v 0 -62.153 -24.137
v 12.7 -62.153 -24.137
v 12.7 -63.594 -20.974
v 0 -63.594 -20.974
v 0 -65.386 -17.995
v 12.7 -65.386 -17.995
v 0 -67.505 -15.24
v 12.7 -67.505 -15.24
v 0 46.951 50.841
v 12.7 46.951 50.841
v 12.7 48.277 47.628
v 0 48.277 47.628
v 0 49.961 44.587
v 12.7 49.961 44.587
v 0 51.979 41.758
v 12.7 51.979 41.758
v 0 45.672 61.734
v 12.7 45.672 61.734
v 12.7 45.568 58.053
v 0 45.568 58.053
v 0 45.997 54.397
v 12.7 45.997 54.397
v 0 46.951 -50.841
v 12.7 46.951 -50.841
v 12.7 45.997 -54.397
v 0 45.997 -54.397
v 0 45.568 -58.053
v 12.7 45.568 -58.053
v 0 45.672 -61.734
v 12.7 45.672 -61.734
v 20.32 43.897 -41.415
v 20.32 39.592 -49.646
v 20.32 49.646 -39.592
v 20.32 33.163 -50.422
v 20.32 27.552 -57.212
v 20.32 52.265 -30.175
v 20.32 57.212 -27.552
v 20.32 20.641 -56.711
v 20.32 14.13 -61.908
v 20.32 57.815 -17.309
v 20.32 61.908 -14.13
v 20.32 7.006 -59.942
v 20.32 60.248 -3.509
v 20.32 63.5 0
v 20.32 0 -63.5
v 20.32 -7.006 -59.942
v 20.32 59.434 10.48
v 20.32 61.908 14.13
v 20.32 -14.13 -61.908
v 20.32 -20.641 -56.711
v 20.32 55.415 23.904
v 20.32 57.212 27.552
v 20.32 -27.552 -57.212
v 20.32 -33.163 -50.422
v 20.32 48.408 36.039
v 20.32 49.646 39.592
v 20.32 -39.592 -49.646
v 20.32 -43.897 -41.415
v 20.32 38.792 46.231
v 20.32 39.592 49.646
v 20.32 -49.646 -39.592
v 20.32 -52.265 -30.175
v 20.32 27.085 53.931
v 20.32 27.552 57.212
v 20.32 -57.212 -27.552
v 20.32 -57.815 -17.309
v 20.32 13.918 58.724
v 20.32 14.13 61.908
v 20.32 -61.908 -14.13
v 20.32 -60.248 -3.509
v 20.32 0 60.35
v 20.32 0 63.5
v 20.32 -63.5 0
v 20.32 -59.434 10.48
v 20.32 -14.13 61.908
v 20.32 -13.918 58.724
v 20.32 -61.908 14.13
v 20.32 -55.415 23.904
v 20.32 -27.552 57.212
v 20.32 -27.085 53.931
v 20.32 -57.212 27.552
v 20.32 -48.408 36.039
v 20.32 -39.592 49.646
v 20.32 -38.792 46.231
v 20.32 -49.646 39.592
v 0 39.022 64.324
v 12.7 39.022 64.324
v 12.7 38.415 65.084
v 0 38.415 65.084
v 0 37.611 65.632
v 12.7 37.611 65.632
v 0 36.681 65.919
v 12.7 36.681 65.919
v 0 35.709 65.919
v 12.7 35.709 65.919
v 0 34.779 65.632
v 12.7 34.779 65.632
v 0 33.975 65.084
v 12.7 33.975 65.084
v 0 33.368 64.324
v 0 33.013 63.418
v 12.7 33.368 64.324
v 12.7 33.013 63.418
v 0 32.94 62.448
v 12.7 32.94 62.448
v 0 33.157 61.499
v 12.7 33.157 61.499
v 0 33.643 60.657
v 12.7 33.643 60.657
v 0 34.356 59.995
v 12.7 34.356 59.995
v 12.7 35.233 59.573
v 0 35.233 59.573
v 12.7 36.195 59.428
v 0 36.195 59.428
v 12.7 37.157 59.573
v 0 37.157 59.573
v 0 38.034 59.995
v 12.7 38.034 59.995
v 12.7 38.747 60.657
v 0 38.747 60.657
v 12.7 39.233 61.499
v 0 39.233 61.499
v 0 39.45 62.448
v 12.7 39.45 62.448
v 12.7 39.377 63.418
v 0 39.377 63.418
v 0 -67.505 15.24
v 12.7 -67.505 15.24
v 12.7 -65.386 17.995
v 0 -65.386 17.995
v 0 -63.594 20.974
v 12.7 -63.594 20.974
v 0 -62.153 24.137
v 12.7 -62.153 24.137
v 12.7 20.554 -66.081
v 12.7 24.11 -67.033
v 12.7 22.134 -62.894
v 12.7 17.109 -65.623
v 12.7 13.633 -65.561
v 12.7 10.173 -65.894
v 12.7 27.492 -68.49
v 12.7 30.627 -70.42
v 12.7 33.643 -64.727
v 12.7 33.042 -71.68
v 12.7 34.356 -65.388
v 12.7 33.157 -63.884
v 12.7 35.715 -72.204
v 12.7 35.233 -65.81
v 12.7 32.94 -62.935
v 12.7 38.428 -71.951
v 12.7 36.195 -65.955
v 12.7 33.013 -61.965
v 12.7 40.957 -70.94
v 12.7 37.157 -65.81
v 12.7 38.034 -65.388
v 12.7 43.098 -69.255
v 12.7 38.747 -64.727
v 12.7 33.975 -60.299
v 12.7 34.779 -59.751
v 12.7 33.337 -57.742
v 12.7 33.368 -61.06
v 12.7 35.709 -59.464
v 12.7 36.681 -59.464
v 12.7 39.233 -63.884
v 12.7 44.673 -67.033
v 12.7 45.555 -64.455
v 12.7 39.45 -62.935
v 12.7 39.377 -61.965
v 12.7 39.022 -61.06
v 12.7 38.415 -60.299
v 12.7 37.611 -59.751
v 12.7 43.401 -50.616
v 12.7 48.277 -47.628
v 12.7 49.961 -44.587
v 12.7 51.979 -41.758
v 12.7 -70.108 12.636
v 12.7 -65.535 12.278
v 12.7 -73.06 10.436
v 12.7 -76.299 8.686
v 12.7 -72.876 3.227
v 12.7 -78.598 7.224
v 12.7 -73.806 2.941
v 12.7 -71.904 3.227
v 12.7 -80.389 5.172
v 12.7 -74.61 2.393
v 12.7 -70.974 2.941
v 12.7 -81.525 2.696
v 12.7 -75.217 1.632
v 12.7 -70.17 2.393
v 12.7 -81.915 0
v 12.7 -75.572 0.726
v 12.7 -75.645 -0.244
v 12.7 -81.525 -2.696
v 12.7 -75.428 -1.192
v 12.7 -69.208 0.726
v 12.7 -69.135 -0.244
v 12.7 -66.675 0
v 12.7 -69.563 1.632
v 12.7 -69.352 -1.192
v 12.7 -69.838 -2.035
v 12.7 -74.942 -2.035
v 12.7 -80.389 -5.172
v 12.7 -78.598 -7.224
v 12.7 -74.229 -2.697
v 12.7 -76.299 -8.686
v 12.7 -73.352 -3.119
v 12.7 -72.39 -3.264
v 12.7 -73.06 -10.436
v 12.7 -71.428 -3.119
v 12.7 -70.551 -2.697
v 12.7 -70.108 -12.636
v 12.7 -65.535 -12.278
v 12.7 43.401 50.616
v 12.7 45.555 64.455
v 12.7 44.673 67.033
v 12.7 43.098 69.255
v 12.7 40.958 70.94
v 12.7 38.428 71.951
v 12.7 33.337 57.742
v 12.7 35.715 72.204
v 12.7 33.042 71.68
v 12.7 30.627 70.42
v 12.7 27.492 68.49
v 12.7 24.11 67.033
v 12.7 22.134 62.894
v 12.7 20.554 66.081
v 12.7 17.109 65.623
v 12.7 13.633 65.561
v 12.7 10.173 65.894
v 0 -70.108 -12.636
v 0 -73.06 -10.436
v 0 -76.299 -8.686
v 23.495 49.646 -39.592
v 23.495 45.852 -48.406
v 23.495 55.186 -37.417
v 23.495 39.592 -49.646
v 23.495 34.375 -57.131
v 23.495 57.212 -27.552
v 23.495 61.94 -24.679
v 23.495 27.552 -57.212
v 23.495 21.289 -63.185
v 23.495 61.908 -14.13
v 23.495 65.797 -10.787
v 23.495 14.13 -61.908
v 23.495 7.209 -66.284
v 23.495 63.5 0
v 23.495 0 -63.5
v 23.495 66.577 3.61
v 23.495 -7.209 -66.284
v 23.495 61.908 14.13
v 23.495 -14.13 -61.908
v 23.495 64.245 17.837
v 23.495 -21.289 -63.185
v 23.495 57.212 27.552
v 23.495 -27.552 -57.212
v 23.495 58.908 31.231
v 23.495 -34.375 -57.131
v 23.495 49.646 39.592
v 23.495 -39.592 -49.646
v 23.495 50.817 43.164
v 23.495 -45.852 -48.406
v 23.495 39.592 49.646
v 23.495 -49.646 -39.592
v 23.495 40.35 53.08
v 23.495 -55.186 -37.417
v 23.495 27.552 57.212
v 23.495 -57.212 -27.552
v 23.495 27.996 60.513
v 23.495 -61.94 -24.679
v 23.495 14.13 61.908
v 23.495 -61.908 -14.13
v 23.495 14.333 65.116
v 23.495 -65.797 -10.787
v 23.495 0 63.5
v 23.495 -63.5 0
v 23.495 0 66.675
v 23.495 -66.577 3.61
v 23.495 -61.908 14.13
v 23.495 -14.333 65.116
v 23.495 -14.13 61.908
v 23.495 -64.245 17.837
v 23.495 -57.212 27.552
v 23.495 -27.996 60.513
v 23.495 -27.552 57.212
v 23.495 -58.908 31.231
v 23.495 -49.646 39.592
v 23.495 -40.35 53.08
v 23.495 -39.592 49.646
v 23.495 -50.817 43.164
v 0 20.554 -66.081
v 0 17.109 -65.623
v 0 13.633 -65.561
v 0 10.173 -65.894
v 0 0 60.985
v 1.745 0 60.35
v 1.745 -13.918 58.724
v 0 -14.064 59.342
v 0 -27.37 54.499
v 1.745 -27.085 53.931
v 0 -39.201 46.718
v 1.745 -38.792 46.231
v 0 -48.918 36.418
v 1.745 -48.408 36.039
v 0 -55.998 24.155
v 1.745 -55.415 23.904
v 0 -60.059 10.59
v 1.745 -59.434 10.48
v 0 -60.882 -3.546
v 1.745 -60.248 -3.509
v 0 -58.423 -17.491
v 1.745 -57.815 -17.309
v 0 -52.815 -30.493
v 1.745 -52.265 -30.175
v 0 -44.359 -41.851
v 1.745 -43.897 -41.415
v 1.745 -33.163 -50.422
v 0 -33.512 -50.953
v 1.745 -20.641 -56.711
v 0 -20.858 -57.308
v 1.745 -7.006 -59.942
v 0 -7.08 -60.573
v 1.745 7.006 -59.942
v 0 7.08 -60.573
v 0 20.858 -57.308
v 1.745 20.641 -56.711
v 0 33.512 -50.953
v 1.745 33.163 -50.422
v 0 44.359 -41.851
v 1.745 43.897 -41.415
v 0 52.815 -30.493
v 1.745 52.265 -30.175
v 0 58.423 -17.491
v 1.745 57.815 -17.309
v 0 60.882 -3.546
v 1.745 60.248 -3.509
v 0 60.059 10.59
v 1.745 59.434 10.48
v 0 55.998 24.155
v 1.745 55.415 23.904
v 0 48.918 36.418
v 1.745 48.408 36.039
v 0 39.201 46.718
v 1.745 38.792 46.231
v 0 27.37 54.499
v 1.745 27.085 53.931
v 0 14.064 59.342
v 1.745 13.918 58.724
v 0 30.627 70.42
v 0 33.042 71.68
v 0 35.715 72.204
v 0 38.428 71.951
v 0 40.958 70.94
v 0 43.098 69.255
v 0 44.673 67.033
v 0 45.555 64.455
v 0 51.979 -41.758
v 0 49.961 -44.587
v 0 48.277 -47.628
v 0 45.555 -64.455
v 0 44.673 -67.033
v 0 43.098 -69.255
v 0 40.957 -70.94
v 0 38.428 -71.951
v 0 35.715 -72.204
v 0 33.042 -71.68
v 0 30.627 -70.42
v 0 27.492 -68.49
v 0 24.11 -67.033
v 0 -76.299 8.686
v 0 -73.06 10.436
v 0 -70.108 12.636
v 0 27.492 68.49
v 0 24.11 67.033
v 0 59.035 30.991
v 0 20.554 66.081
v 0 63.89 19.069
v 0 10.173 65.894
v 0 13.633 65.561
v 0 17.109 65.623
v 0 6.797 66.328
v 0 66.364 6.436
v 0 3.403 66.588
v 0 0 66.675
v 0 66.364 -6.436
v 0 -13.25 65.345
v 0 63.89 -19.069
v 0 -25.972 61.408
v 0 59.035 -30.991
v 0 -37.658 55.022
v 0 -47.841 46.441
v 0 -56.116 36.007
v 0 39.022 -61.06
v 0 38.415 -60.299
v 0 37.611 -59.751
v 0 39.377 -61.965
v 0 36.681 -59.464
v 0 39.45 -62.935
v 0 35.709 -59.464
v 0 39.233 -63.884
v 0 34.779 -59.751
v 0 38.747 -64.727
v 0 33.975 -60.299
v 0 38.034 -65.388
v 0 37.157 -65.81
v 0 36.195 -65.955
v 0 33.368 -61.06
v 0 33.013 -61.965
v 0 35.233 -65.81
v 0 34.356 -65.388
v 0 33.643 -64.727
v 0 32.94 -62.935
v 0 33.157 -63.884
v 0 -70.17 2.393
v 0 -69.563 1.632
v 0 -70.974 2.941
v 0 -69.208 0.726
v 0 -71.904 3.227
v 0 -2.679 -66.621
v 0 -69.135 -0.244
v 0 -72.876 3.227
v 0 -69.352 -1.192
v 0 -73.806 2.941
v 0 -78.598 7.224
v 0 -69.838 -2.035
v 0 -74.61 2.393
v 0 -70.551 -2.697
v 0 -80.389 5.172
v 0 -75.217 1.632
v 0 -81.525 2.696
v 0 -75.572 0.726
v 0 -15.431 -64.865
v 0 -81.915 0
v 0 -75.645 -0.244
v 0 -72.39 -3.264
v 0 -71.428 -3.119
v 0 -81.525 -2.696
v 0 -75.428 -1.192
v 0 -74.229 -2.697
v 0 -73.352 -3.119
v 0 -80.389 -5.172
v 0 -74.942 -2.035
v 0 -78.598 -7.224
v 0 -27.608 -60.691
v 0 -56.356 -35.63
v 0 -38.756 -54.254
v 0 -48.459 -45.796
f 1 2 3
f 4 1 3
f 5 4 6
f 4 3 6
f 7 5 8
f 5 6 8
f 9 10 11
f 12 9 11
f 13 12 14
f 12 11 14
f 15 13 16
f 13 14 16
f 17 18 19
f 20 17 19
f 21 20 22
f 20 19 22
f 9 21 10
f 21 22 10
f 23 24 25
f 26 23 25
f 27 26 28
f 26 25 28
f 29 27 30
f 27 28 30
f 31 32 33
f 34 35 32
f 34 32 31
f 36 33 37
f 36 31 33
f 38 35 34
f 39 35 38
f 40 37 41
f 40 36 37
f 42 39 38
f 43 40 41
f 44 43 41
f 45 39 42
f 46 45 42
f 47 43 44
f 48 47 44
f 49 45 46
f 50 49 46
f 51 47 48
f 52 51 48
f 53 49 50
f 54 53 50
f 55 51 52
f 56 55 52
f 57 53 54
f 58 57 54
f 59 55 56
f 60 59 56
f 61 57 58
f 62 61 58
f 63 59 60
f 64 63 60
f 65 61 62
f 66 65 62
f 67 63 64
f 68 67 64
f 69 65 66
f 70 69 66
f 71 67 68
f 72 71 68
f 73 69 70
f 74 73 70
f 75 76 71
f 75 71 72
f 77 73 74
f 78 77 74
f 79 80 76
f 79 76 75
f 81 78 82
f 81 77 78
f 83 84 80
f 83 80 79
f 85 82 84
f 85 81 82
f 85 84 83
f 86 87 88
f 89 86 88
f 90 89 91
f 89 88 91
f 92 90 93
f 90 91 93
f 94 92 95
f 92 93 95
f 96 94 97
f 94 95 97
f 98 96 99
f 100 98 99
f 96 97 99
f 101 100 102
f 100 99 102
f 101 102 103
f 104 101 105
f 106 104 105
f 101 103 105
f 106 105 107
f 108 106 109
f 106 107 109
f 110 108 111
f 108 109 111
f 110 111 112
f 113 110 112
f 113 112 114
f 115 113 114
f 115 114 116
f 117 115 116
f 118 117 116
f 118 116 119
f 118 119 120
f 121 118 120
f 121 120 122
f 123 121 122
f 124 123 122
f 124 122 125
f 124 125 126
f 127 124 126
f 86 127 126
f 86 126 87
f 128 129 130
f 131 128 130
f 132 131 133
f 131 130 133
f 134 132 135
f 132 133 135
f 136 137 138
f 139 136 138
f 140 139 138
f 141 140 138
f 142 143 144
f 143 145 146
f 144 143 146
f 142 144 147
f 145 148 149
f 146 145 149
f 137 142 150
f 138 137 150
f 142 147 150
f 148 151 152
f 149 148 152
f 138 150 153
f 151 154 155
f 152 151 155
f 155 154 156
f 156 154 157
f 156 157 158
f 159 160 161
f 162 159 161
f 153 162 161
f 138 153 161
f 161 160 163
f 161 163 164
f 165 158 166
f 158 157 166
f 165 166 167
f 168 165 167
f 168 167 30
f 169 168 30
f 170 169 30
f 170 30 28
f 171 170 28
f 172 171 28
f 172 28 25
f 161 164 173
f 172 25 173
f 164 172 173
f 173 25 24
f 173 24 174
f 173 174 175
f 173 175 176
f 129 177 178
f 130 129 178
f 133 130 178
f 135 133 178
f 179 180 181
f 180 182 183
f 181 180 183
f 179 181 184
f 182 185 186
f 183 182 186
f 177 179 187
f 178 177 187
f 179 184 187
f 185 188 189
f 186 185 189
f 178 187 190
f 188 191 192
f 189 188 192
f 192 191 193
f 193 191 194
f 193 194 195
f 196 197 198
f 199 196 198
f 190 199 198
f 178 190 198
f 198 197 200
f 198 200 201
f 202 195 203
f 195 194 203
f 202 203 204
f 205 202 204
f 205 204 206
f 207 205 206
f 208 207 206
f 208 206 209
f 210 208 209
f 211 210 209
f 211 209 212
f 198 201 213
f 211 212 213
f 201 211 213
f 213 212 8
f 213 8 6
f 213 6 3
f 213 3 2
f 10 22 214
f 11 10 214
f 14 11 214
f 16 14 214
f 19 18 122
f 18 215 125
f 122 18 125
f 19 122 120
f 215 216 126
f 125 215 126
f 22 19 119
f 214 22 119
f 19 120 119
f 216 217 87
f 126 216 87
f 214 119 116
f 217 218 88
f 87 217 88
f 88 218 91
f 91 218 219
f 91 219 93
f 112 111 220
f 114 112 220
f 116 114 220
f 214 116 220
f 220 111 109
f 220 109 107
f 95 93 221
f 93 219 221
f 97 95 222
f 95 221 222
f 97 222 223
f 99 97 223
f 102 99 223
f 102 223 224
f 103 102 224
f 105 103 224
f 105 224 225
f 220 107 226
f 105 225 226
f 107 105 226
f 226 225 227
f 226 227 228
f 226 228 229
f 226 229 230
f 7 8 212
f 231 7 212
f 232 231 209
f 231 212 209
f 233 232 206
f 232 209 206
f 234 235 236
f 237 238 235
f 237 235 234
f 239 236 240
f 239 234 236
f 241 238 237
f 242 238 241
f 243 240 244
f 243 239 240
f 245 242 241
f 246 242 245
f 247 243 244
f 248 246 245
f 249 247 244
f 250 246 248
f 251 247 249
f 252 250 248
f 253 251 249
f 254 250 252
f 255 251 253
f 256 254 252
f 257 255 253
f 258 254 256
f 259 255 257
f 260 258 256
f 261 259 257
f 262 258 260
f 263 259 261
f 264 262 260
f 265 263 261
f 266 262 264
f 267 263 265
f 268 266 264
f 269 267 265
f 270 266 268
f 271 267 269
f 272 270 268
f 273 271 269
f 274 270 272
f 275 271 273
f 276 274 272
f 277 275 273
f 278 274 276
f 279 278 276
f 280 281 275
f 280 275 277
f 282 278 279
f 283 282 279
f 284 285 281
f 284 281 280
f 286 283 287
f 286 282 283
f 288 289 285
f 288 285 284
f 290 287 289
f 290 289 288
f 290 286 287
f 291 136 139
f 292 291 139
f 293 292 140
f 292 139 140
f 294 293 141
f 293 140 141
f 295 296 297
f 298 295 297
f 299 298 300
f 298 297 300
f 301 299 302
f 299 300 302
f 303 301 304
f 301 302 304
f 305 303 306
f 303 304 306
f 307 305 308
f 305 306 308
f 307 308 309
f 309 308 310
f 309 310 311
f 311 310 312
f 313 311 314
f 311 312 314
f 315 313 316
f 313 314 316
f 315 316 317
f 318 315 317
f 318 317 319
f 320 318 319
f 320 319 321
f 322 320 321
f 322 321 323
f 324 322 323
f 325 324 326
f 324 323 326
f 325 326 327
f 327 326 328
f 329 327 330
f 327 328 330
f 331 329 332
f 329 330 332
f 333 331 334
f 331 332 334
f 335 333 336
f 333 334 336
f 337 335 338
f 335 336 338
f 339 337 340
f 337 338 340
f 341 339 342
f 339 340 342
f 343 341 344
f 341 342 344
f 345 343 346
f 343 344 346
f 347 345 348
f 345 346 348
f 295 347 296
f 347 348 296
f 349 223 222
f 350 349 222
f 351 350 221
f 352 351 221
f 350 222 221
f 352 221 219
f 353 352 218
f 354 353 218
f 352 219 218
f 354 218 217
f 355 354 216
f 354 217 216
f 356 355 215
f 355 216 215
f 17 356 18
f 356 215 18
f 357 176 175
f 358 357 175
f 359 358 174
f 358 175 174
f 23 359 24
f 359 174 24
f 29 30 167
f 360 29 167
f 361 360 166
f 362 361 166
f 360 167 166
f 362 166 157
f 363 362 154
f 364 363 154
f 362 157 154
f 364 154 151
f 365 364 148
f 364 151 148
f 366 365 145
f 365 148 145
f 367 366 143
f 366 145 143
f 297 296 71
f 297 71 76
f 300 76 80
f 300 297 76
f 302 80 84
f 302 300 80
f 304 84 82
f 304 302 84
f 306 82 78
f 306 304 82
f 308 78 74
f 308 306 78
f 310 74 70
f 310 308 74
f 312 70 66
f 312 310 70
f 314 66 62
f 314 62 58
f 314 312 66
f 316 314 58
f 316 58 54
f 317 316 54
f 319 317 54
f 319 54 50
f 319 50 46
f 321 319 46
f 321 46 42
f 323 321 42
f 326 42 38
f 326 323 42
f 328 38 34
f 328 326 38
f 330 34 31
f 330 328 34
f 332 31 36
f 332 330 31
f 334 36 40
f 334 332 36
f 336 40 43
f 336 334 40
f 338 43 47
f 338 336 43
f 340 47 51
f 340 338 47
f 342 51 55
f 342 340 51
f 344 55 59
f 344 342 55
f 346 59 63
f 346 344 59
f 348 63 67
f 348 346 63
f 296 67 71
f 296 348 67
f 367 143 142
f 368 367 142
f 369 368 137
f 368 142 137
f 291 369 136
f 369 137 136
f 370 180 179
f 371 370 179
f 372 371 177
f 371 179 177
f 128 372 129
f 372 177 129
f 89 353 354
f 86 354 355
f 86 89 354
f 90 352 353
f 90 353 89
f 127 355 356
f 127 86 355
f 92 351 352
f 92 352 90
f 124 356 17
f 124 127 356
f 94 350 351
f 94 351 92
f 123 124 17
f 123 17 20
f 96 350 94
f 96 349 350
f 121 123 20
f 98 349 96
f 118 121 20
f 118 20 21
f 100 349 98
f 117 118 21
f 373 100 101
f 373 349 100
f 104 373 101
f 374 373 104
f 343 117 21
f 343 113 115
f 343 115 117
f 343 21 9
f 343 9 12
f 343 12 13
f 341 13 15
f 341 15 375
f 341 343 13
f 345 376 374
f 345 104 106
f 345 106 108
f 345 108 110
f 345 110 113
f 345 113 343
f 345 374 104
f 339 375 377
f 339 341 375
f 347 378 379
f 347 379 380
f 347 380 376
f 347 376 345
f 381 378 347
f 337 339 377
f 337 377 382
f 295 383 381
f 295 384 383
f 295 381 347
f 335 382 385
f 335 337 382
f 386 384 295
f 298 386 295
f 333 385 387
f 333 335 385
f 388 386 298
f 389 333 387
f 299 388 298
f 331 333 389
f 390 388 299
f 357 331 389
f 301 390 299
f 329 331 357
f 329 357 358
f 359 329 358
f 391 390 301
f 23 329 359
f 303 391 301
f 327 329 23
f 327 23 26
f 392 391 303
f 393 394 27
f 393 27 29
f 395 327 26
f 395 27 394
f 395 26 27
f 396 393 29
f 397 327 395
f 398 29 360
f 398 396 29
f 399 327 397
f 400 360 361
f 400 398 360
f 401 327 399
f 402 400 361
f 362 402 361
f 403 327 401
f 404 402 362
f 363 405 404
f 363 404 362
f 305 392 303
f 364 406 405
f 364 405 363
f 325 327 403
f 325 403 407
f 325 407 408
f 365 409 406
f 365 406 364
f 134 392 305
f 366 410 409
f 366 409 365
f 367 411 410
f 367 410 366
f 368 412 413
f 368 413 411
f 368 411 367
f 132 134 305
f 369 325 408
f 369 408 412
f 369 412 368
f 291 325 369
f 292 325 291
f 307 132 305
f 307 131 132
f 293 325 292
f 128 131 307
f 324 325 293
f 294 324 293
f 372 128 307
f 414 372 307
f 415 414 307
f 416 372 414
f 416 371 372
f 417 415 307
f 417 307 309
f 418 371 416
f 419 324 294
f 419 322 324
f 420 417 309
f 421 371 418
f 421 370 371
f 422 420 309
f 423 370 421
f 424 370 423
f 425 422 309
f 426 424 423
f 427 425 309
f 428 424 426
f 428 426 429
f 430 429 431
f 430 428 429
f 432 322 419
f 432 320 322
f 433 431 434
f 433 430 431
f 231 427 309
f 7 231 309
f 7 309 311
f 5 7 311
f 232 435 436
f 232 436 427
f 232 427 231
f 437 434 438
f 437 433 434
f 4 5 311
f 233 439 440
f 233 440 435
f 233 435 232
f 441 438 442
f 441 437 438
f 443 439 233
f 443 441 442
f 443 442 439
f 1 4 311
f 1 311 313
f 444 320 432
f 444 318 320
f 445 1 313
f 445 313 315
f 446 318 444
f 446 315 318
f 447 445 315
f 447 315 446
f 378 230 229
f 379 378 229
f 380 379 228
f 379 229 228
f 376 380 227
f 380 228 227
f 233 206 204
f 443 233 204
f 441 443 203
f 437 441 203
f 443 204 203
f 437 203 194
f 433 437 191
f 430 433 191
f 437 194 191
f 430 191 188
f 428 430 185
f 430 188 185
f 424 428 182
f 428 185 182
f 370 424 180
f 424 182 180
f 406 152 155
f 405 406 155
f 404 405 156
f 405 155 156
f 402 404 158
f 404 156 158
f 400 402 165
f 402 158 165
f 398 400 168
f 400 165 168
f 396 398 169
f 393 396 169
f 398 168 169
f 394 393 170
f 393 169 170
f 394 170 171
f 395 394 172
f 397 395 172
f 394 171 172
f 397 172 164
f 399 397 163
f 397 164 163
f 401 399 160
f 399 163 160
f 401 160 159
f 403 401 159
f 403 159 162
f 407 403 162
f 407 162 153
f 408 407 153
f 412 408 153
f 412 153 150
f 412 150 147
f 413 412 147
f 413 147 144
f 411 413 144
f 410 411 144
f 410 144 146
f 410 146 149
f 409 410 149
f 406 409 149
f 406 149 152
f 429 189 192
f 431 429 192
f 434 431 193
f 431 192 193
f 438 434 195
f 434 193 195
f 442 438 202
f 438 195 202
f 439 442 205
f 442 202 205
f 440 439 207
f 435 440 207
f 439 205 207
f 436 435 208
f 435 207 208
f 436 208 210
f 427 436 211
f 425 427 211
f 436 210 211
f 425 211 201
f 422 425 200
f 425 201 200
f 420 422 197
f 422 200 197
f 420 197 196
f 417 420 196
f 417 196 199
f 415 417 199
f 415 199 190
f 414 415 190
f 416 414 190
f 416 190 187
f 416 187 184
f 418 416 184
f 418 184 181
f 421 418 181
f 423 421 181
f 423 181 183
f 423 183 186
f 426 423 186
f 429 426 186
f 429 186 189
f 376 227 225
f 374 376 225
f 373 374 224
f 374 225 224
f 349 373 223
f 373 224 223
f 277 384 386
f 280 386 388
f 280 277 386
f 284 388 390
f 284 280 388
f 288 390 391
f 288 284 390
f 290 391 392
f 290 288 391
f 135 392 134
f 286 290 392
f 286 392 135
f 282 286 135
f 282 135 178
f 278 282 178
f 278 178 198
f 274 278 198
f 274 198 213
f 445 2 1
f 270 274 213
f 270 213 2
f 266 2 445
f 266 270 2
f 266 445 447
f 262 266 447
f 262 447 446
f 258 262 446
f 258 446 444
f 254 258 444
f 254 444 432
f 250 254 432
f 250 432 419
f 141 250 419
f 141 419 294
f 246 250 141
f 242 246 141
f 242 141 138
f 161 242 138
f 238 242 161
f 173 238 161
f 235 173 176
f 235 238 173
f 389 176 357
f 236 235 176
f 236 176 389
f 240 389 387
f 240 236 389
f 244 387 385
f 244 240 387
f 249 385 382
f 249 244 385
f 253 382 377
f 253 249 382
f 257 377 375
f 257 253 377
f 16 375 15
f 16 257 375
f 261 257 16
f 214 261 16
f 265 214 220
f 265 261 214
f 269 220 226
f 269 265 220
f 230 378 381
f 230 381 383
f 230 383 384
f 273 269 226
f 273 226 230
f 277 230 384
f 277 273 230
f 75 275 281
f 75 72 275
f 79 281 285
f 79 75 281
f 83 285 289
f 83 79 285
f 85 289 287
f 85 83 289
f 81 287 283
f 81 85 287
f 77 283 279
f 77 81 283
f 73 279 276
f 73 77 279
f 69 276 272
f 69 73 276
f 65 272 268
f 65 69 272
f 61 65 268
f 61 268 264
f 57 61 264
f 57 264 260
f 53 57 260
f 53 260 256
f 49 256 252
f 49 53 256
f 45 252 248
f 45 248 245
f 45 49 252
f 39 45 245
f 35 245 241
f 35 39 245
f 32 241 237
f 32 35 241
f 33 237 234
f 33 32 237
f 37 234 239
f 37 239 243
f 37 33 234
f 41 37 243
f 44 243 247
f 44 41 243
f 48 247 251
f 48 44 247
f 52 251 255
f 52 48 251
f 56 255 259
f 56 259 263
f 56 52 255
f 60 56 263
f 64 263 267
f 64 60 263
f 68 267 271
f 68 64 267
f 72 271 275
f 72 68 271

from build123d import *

# Parameters (mm, degrees)
BOSS_EXTRUDE1_START     = -12.7
BOSS_EXTRUDE1_DEPTH     = 12.7
F_1_4_CLEARANCE_HOLE1_D = 6.5278
CIRPATTERN1_COUNT       = 3
CHAMFER1_SIZE           = 0.635
CHAMFER1_SIZE2          = 1.744648161


with BuildPart() as part:
    # Sketch1 → Revolve1 (revolve)
    with BuildSketch(Plane.XY, mode=Mode.PRIVATE) as revolve1_sk:
        Polygon((0, 66.675), (23.495, 66.675), (23.495, 63.5), (20.32, 63.5), (20.32, 60.3504), (0, 60.3504), align=None)
    revolve(revolve1_sk.sketch.rotate(Axis((0, 0, 0), (1, 0, 0)), 90), axis=Axis((0, 0, 0), (1, 0, 0)))

    # Sketch5 → Boss-Extrude1 (add)
    with BuildSketch(Plane.ZY.offset(BOSS_EXTRUDE1_START)):
        with BuildLine():
            ThreePointArc((-61.733643772, 45.671707505), (-70.940470951, 40.9575), (-70.41968082, 30.627050022))
            ThreePointArc((-70.41968082, 30.627050022), (-67.700076965, 25.827577718), (-66.080812198, 20.554138506))
            ThreePointArc((-66.080812198, 20.554138506), (-65.542300069, 15.371802621), (-65.894280688, 10.17346537))
            ThreePointArc((-65.894280688, 10.17346537), (-57.742243797, 33.3375), (-41.757619799, 51.979388355))
            ThreePointArc((-41.757619799, 51.979388355), (-46.083521606, 49.075395572), (-50.840812198, 46.950592813))
            ThreePointArc((-50.840812198, 46.950592813), (-56.217376905, 45.716197631), (-61.733643772, 45.671707505))
        make_face()
    boss_extrude1 = extrude(amount=BOSS_EXTRUDE1_DEPTH)

    # 1/4 Clearance Hole1 (through all)
    with Locations(Plane.ZY):
        with Locations((-62.69157898, 36.195)):
            f_1_4_clearance_hole1 = Hole(F_1_4_CLEARANCE_HOLE1_D / 2)

    # CirPattern1: Boss-Extrude1, 1/4 Clearance Hole1 ×3 about axis
    cirpattern1_axis = Axis((0, 0, 0), (1, 0, 0))
    add([boss_extrude1.rotate(cirpattern1_axis, i * 360 / CIRPATTERN1_COUNT) for i in range(1, CIRPATTERN1_COUNT)])
    add([f_1_4_clearance_hole1.rotate(cirpattern1_axis, i * 360 / CIRPATTERN1_COUNT) for i in range(1, CIRPATTERN1_COUNT)], mode=Mode.SUBTRACT)

    # Chamfer1
    chamfer1_edges = [part.edges().sort_by_distance(p)[0] for p in [
        (0, 0, -60.3504),
    ]]
    chamfer1_side = [part.faces().sort_by_distance(p)[0] for p in [
        (0, -36.487585779, 53.312085734),
    ]]
    chamfer(chamfer1_edges, length=CHAMFER1_SIZE, length2=CHAMFER1_SIZE2, reference=chamfer1_side[0])


solid = part.part
